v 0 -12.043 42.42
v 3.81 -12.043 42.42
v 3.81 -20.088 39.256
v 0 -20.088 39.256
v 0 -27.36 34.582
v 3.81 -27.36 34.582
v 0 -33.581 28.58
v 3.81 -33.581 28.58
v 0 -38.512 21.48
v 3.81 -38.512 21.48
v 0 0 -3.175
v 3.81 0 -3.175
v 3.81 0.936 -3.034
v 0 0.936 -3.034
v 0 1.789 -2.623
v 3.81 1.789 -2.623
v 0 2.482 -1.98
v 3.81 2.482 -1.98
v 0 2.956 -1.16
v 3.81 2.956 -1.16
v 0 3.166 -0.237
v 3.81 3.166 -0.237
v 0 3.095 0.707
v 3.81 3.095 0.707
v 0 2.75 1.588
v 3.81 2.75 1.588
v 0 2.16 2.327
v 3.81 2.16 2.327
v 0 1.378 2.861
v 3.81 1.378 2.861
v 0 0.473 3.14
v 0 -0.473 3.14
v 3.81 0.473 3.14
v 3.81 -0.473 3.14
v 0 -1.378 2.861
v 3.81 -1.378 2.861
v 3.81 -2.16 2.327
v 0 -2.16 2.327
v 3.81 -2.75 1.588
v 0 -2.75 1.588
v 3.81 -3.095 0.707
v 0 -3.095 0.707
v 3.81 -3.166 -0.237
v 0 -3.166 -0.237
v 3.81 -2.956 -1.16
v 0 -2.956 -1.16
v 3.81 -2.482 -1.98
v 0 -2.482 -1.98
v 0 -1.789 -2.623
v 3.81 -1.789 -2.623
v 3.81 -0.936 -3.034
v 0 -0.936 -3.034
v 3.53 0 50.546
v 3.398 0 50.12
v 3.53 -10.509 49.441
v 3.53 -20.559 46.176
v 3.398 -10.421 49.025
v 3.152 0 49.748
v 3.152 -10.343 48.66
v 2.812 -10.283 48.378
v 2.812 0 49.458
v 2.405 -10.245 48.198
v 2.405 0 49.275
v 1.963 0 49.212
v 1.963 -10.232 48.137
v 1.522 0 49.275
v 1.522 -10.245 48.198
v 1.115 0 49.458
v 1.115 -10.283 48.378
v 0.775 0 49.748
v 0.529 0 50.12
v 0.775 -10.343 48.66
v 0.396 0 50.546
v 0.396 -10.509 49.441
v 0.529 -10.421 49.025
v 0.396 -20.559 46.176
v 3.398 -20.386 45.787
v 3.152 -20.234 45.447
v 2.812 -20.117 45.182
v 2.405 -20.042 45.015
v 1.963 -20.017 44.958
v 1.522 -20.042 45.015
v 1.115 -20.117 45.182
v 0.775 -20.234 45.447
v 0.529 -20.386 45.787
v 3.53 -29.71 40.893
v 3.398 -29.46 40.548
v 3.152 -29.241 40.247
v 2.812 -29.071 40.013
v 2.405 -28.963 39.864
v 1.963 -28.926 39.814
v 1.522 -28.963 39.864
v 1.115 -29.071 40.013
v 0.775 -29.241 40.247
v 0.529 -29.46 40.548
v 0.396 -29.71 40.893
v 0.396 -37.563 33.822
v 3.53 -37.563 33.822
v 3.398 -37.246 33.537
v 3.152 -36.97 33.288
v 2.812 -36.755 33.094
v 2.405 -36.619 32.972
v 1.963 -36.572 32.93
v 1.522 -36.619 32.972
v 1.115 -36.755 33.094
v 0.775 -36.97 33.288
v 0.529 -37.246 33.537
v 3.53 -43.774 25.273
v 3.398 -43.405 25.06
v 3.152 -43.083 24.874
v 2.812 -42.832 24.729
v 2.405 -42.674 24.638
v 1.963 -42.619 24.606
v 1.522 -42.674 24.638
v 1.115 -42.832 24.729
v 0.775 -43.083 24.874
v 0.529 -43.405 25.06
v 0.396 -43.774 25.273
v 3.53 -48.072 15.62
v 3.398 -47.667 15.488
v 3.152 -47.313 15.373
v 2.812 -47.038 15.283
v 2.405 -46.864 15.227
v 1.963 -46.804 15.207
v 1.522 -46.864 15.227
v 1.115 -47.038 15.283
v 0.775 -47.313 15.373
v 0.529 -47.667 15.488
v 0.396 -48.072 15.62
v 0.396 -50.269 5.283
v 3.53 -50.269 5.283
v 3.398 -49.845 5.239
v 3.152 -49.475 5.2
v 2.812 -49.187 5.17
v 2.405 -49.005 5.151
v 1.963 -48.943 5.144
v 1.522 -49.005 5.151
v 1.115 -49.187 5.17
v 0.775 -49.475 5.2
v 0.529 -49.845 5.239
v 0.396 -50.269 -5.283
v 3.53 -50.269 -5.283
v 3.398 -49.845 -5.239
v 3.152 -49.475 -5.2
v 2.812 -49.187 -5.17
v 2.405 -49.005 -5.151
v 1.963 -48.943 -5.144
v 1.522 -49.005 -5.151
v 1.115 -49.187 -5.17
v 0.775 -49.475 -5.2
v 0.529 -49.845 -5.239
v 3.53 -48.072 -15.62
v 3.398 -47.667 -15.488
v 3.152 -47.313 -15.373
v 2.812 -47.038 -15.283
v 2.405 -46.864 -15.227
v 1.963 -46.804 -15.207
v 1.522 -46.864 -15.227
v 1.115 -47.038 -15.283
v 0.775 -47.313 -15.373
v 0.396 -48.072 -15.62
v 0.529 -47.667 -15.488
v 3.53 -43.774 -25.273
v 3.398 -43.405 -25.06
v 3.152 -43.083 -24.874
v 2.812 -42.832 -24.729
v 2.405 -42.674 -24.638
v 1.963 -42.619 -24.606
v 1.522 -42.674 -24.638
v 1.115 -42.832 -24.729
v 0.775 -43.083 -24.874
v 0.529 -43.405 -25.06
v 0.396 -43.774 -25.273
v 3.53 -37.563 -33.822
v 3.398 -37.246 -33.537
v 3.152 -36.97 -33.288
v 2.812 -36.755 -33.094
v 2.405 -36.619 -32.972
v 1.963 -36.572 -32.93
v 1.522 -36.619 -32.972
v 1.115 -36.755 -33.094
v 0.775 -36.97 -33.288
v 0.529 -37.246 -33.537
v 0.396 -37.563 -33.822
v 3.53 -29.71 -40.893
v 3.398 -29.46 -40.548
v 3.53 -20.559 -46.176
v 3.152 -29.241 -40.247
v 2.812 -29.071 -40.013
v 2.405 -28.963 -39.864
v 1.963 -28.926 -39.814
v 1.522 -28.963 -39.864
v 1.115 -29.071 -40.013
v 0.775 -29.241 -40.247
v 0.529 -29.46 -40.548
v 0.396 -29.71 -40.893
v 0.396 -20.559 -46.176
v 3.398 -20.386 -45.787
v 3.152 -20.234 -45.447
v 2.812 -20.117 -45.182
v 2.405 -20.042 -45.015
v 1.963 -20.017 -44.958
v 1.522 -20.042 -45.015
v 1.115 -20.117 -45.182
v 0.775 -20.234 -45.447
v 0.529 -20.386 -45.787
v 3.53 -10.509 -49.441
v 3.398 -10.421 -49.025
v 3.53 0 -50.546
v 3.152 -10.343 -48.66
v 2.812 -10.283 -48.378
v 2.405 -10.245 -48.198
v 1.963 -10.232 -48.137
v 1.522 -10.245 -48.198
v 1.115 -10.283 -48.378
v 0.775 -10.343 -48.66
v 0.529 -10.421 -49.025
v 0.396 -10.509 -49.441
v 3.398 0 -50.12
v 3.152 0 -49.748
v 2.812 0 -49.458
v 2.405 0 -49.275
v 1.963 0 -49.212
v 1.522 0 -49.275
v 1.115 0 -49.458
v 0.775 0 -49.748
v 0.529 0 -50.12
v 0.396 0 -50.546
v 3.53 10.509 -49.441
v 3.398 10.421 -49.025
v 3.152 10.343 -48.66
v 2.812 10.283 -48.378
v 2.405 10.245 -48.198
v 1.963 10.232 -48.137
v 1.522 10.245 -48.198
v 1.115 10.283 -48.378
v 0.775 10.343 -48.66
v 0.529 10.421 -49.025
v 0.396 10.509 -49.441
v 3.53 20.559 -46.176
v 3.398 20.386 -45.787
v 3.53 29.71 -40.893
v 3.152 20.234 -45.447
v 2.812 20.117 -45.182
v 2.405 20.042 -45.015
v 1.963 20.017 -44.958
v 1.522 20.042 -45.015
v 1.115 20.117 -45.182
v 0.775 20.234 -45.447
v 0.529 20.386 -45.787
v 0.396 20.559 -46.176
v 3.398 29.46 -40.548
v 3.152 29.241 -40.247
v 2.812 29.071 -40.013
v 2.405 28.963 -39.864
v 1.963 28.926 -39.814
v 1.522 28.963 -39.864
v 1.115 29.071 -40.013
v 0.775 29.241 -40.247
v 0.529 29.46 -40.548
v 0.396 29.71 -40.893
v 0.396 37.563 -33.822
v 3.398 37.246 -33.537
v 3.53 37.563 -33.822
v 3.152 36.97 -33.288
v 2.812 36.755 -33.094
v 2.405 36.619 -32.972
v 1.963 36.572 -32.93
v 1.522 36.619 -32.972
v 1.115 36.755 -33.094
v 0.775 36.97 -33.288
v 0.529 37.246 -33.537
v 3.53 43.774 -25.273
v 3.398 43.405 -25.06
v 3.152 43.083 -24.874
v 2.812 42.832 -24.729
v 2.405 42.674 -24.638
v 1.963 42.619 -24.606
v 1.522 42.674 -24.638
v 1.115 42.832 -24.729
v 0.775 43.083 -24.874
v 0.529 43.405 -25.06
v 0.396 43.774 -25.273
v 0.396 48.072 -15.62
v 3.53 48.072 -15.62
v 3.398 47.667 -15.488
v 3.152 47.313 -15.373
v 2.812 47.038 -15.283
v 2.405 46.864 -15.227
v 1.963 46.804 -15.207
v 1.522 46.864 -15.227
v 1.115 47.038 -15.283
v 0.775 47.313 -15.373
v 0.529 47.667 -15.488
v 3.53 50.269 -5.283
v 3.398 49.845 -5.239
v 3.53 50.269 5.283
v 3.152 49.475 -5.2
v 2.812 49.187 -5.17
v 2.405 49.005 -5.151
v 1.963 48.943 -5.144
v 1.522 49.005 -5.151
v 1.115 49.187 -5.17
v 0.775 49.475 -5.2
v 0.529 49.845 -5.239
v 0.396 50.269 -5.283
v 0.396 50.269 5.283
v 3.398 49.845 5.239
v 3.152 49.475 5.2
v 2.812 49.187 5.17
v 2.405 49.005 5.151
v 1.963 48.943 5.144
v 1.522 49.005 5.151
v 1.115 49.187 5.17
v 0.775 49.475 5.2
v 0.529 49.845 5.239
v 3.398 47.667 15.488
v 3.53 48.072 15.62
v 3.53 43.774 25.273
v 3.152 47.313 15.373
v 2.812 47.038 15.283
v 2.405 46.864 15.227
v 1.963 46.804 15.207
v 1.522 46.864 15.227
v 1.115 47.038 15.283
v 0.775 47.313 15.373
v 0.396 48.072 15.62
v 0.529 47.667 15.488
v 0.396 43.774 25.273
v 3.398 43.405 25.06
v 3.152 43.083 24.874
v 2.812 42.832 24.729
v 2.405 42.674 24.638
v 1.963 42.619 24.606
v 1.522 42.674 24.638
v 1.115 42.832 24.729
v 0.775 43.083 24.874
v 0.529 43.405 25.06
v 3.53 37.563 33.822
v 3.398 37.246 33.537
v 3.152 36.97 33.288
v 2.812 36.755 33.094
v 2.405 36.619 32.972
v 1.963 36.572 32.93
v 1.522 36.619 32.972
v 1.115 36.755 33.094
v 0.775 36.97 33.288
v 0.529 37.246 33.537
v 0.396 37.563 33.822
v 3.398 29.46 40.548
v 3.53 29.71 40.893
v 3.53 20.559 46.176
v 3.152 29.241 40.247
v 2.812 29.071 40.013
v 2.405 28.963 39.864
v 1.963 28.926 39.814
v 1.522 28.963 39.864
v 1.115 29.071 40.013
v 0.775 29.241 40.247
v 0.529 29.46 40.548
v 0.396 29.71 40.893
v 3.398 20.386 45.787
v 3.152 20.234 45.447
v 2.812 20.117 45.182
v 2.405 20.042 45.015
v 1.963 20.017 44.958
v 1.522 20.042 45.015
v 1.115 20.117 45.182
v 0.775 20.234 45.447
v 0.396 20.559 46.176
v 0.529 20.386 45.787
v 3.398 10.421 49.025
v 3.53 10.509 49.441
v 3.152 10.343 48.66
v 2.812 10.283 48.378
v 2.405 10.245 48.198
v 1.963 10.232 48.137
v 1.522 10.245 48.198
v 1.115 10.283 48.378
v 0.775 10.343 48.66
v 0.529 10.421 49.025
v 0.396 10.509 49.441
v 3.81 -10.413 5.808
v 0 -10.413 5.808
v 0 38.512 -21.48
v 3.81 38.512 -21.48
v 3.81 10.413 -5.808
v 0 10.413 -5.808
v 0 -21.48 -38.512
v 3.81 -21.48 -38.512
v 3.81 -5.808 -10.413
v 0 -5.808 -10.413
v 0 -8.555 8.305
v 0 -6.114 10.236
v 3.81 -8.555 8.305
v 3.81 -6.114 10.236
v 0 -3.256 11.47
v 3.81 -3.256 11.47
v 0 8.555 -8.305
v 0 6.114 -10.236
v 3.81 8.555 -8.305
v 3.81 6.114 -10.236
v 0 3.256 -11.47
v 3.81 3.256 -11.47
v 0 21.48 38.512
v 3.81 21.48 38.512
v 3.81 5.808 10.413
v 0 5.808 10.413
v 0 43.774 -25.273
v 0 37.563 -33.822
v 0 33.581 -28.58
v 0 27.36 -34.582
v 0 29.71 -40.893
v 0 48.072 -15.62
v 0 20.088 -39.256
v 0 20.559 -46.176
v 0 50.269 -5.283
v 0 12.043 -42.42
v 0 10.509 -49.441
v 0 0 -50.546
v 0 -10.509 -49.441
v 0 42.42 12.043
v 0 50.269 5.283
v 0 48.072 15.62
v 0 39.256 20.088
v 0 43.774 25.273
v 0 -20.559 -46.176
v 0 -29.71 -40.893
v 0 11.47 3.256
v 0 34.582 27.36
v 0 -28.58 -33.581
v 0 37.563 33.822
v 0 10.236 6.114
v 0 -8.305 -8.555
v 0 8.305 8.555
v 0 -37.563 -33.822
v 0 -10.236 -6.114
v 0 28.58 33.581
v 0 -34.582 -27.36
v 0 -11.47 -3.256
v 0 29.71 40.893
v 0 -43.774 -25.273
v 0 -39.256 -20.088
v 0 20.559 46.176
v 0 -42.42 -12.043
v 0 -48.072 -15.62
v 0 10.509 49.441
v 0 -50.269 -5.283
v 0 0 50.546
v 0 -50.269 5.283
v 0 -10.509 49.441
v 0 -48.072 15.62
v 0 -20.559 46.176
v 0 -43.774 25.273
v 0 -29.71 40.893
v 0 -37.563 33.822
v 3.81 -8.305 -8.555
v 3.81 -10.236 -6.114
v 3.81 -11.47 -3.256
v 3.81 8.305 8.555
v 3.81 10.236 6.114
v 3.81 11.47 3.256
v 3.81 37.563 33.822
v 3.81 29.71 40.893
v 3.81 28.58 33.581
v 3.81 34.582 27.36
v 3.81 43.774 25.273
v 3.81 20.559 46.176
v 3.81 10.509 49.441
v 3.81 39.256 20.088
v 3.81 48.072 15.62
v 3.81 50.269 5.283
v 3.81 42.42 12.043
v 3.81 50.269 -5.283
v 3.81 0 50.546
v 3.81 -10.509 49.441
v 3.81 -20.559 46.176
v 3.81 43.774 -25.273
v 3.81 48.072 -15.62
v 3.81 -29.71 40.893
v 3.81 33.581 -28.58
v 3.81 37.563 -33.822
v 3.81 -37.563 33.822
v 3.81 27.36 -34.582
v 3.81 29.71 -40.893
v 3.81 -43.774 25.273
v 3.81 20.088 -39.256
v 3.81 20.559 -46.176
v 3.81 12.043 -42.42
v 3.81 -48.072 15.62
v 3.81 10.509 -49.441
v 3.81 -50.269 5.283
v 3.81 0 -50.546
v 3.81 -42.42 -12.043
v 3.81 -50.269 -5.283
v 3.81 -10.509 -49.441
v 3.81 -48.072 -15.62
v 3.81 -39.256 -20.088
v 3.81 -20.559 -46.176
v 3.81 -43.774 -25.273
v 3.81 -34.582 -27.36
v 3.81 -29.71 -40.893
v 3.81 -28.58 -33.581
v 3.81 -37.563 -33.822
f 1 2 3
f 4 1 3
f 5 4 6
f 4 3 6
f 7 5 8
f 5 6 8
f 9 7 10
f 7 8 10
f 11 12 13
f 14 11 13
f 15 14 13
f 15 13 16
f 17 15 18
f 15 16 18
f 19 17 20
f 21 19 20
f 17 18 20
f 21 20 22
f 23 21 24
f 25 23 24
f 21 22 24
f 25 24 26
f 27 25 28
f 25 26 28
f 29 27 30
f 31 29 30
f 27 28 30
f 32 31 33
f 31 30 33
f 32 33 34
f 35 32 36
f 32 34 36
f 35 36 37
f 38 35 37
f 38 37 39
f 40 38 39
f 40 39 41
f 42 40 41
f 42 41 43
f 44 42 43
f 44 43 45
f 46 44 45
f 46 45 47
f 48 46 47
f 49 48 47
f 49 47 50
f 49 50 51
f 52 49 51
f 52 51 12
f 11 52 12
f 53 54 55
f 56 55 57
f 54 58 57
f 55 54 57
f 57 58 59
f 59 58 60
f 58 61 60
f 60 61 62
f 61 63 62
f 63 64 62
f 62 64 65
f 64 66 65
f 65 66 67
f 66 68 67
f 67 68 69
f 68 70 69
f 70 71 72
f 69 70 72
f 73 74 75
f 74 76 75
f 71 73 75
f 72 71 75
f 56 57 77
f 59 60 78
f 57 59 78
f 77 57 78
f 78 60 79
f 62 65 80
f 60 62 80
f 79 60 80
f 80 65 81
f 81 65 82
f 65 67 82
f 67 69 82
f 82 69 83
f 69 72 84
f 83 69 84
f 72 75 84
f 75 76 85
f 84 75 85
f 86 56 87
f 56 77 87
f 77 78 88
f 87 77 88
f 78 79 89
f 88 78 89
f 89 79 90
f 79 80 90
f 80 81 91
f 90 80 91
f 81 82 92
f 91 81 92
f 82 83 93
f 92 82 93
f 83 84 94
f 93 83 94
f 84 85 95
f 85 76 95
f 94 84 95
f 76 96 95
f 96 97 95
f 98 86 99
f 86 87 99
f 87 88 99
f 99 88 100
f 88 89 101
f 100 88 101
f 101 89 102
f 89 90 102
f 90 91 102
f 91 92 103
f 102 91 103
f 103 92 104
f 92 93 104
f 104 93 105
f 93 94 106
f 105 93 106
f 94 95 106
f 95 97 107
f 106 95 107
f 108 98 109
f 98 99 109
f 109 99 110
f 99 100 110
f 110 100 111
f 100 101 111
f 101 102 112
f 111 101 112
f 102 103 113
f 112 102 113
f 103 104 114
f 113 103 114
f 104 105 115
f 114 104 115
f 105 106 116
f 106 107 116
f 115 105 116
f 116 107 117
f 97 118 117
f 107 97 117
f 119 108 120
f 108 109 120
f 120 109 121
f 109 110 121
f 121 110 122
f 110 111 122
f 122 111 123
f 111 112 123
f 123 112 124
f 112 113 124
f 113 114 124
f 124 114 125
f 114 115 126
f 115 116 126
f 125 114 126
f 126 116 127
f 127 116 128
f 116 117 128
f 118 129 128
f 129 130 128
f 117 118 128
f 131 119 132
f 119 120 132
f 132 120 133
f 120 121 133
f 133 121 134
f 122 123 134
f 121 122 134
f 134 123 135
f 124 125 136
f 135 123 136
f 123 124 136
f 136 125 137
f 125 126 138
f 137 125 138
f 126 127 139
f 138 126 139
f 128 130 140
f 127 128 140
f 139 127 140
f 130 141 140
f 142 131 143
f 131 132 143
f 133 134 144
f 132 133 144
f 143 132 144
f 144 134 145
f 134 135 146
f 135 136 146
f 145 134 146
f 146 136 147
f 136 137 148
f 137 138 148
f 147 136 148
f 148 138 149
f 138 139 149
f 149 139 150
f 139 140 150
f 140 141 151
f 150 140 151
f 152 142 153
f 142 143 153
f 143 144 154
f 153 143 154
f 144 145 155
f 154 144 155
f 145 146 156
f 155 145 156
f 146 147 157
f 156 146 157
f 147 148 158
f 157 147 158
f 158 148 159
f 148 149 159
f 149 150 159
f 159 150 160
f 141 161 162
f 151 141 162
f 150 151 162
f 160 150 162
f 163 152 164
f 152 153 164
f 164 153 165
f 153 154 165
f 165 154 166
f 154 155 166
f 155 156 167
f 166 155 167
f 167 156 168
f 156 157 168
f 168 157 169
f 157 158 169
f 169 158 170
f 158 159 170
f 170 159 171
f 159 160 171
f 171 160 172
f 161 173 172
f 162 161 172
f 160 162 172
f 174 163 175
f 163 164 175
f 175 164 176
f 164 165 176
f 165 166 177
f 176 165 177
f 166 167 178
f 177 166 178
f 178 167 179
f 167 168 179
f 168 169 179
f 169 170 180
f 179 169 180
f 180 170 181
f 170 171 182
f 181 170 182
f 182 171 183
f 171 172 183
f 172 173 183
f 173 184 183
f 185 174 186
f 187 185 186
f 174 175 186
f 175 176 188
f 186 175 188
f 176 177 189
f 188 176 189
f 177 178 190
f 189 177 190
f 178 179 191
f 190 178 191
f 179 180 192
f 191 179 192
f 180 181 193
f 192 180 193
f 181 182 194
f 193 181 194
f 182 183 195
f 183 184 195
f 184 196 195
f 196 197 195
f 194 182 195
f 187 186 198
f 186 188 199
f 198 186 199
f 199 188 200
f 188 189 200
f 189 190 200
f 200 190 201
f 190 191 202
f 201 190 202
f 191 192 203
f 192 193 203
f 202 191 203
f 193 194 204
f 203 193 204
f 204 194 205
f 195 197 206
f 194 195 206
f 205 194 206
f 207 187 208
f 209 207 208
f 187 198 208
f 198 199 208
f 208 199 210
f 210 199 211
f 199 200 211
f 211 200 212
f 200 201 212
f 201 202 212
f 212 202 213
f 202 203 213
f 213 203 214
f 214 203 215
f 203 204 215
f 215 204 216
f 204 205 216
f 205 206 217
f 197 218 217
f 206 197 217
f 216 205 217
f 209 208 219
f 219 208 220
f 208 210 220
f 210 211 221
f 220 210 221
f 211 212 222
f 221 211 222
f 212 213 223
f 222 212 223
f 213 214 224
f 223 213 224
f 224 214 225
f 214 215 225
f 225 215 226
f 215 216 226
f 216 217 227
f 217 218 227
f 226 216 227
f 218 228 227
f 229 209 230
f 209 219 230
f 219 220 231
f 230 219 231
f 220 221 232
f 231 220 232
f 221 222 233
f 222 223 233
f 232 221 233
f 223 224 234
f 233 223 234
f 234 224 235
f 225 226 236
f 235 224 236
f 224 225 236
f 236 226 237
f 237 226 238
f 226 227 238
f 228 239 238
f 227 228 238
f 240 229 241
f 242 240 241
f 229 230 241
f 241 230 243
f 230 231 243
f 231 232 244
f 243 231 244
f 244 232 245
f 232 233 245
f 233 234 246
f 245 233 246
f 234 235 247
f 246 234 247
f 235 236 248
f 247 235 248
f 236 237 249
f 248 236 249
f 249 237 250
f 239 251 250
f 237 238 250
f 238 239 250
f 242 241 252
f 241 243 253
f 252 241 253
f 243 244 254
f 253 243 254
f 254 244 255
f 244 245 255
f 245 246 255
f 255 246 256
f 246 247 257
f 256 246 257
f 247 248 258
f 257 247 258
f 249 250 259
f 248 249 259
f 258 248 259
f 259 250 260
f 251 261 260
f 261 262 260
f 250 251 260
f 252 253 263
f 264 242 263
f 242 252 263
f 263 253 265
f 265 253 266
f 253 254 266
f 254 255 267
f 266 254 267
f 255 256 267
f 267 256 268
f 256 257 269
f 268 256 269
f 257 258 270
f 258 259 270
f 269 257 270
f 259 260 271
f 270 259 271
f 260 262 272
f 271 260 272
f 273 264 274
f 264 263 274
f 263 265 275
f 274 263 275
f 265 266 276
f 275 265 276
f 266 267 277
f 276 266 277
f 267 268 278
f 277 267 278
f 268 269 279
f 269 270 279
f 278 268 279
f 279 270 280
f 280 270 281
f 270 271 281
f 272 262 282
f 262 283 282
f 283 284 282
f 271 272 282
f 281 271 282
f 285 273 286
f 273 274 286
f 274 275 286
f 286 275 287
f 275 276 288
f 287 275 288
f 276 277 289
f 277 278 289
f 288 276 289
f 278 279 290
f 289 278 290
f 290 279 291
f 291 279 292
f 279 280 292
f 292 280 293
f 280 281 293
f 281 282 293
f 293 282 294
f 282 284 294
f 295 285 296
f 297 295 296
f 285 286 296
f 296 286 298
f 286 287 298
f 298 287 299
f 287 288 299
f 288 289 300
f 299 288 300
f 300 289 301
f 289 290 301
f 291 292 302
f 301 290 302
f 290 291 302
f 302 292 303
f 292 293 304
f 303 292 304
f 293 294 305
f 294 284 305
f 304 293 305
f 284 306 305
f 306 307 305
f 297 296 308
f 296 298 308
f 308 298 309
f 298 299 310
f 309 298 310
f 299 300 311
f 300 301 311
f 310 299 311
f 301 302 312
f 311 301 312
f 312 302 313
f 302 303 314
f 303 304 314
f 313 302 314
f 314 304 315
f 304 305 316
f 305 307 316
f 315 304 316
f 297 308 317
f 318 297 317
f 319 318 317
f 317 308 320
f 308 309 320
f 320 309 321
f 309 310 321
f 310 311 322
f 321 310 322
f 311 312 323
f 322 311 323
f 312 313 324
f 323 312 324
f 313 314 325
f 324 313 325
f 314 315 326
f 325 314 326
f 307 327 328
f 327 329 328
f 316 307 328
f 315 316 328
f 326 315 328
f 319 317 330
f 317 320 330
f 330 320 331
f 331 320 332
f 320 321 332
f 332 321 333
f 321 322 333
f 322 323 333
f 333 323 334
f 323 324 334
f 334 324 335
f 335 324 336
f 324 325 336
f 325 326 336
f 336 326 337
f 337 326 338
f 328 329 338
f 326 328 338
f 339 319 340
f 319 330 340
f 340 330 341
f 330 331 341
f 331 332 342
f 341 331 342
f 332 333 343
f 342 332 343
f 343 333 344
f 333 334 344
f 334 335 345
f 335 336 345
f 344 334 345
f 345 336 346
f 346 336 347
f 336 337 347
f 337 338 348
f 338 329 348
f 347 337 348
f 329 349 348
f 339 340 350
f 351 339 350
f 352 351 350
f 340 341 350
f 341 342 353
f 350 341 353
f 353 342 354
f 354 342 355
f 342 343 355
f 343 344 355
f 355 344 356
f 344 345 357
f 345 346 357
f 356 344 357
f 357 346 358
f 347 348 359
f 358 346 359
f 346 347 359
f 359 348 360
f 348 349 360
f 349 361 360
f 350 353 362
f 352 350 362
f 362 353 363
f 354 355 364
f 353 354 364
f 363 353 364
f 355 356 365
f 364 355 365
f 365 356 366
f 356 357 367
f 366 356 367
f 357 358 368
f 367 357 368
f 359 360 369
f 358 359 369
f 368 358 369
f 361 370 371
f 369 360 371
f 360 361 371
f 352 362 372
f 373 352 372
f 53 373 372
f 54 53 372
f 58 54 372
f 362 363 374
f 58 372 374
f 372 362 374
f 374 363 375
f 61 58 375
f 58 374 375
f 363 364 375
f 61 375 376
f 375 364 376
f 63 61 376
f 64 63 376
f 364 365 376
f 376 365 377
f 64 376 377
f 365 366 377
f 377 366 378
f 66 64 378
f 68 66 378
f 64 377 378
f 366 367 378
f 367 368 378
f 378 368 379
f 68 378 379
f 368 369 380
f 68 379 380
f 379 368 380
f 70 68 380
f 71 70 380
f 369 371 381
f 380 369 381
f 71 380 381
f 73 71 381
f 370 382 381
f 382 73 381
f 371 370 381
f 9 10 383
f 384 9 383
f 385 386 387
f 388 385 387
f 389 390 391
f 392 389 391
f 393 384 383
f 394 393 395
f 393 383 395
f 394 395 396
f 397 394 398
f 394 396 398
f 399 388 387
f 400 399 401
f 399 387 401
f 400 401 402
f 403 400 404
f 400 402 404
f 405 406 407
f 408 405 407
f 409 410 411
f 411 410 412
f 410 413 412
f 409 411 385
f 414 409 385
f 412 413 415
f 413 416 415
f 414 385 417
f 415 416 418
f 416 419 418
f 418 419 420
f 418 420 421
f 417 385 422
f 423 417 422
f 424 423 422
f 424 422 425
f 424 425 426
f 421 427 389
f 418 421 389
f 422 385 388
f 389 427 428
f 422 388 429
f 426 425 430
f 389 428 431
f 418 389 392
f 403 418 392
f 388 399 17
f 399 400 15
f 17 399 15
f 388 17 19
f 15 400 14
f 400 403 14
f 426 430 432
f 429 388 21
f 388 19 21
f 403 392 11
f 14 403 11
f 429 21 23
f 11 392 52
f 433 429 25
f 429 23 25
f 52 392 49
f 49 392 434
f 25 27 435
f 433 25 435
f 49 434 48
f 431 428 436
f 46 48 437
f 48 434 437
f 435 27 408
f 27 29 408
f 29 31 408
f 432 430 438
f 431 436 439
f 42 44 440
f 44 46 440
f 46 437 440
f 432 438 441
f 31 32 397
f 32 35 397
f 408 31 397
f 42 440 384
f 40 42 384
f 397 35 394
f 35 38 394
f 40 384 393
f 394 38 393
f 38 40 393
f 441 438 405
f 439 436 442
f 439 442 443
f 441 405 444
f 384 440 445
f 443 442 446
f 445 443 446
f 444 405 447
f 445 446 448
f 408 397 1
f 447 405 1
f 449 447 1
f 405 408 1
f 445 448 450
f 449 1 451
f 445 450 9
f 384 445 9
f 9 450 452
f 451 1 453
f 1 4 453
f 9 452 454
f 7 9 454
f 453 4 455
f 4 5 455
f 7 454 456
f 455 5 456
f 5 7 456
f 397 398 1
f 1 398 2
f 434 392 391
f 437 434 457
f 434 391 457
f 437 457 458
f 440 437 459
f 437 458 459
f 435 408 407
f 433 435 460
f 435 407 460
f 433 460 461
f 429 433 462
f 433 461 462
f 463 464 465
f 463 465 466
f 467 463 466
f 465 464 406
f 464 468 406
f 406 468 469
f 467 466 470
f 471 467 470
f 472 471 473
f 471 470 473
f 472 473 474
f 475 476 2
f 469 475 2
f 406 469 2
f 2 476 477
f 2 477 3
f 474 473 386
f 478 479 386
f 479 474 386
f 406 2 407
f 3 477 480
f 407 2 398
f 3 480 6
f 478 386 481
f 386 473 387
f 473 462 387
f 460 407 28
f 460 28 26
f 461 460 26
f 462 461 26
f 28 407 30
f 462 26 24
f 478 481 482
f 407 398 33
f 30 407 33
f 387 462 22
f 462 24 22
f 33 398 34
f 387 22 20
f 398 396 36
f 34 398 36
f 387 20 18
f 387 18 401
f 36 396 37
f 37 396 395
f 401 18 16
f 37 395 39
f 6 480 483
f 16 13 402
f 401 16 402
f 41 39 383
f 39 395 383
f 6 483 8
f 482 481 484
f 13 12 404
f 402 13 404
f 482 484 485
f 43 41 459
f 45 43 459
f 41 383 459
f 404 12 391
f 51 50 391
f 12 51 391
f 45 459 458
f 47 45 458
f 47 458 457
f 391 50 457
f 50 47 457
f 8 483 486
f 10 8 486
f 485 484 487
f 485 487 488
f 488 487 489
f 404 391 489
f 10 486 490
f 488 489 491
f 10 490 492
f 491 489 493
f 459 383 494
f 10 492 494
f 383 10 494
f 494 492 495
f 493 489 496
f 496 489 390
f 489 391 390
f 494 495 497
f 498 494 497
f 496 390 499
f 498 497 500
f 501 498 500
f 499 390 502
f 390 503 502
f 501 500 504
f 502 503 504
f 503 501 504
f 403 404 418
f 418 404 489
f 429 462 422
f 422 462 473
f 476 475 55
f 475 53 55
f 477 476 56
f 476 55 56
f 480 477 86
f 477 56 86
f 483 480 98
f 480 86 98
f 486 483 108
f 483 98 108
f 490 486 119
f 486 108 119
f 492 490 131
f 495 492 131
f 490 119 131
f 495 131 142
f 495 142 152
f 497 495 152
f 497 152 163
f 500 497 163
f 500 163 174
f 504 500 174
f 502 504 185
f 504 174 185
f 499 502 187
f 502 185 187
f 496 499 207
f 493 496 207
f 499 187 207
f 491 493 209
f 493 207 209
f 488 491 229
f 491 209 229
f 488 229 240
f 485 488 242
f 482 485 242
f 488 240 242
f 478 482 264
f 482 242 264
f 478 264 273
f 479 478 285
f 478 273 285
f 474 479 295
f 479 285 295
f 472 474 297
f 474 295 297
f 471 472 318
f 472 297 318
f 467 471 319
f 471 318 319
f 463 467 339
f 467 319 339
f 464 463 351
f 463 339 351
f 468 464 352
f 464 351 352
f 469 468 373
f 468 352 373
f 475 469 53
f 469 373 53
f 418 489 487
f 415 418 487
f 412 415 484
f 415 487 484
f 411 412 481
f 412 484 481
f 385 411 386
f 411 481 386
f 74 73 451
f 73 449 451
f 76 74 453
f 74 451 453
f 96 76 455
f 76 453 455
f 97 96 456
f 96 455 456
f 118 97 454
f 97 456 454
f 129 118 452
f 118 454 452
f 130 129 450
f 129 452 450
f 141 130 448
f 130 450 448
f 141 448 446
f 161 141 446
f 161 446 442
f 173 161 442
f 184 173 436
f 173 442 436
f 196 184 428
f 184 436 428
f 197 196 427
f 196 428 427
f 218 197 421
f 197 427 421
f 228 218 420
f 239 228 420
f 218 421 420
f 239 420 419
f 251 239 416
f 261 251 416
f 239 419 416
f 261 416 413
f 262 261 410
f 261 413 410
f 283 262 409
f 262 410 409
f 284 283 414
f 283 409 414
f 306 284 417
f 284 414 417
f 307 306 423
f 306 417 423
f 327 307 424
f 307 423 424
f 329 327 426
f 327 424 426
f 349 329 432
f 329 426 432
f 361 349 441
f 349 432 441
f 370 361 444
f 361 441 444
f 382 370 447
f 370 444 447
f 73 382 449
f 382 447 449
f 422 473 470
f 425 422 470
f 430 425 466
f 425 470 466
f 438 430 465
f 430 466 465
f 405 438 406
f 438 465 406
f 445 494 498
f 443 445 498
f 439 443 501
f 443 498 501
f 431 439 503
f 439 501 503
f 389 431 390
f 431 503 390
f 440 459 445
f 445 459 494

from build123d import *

# Parameters (mm, degrees)
SKETCH2_R          = 3.175
CUT_EXTRUDE1_DEPTH = 72.584302274


with BuildPart() as part:
    # Sketch1 → Revolve1 (revolve)
    with BuildSketch(Plane.XY, mode=Mode.PRIVATE) as revolve1_sk:
        with BuildLine():
            Line((0, 0), (3.81, 0))
            Line((3.81, 0), (3.81, 50.546))
            Line((3.81, 50.546), (3.530377137, 50.546))
            ThreePointArc((3.530377137, 50.546), (1.963328877, 49.2125), (0.396280616, 50.546))
            Line((0.396280616, 50.546), (0, 50.546))
            Line((0, 50.546), (0, 0))
        make_face()
    revolve(revolve1_sk.sketch.rotate(Axis((0, 0, 0), (1, 0, 0)), 90), axis=Axis((0, 0, 0), (1, 0, 0)))

    # Sketch2 → Cut-Extrude1 (cut, through all)
    with BuildSketch(Plane(origin=(3.81, 0, 0), x_dir=(0, 0, -1), z_dir=(1, 0, 0))):
        with BuildLine():
            Line((-38.511581654, 21.479742361), (-10.413064573, 5.807861807))
            ThreePointArc((-10.413064573, 5.807861807), (-7.397844739, 9.350671943), (-3.256370105, 11.46992704))
            Line((-3.256370105, 11.46992704), (-12.04332906, 42.420272023))
            ThreePointArc((-12.04332906, 42.420272023), (-27.360120522, 34.582438584), (-38.511581654, 21.479742361))
        make_face()
        with BuildLine():
            Line((21.479742361, 38.511581654), (5.807861807, 10.413064573))
            ThreePointArc((5.807861807, 10.413064573), (9.350671943, 7.397844739), (11.46992704, 3.256370105))
            Line((11.46992704, 3.256370105), (42.420272023, 12.04332906))
            ThreePointArc((42.420272023, 12.04332906), (34.582438584, 27.360120522), (21.479742361, 38.511581654))
        make_face()
        with BuildLine():
            Line((38.511581654, -21.479742361), (10.413064573, -5.807861807))
            ThreePointArc((10.413064573, -5.807861807), (7.397844739, -9.350671943), (3.256370105, -11.46992704))
            Line((3.256370105, -11.46992704), (12.04332906, -42.420272023))
            ThreePointArc((12.04332906, -42.420272023), (27.360120522, -34.582438584), (38.511581654, -21.479742361))
        make_face()
        with BuildLine():
            Line((-21.479742361, -38.511581654), (-5.807861807, -10.413064573))
            ThreePointArc((-5.807861807, -10.413064573), (-9.350671943, -7.397844739), (-11.46992704, -3.256370105))
            Line((-11.46992704, -3.256370105), (-42.420272023, -12.04332906))
            ThreePointArc((-42.420272023, -12.04332906), (-34.582438584, -27.360120522), (-21.479742361, -38.511581654))
        make_face()
        Circle(SKETCH2_R)
    extrude(amount=-CUT_EXTRUDE1_DEPTH, mode=Mode.SUBTRACT)


solid = part.part
